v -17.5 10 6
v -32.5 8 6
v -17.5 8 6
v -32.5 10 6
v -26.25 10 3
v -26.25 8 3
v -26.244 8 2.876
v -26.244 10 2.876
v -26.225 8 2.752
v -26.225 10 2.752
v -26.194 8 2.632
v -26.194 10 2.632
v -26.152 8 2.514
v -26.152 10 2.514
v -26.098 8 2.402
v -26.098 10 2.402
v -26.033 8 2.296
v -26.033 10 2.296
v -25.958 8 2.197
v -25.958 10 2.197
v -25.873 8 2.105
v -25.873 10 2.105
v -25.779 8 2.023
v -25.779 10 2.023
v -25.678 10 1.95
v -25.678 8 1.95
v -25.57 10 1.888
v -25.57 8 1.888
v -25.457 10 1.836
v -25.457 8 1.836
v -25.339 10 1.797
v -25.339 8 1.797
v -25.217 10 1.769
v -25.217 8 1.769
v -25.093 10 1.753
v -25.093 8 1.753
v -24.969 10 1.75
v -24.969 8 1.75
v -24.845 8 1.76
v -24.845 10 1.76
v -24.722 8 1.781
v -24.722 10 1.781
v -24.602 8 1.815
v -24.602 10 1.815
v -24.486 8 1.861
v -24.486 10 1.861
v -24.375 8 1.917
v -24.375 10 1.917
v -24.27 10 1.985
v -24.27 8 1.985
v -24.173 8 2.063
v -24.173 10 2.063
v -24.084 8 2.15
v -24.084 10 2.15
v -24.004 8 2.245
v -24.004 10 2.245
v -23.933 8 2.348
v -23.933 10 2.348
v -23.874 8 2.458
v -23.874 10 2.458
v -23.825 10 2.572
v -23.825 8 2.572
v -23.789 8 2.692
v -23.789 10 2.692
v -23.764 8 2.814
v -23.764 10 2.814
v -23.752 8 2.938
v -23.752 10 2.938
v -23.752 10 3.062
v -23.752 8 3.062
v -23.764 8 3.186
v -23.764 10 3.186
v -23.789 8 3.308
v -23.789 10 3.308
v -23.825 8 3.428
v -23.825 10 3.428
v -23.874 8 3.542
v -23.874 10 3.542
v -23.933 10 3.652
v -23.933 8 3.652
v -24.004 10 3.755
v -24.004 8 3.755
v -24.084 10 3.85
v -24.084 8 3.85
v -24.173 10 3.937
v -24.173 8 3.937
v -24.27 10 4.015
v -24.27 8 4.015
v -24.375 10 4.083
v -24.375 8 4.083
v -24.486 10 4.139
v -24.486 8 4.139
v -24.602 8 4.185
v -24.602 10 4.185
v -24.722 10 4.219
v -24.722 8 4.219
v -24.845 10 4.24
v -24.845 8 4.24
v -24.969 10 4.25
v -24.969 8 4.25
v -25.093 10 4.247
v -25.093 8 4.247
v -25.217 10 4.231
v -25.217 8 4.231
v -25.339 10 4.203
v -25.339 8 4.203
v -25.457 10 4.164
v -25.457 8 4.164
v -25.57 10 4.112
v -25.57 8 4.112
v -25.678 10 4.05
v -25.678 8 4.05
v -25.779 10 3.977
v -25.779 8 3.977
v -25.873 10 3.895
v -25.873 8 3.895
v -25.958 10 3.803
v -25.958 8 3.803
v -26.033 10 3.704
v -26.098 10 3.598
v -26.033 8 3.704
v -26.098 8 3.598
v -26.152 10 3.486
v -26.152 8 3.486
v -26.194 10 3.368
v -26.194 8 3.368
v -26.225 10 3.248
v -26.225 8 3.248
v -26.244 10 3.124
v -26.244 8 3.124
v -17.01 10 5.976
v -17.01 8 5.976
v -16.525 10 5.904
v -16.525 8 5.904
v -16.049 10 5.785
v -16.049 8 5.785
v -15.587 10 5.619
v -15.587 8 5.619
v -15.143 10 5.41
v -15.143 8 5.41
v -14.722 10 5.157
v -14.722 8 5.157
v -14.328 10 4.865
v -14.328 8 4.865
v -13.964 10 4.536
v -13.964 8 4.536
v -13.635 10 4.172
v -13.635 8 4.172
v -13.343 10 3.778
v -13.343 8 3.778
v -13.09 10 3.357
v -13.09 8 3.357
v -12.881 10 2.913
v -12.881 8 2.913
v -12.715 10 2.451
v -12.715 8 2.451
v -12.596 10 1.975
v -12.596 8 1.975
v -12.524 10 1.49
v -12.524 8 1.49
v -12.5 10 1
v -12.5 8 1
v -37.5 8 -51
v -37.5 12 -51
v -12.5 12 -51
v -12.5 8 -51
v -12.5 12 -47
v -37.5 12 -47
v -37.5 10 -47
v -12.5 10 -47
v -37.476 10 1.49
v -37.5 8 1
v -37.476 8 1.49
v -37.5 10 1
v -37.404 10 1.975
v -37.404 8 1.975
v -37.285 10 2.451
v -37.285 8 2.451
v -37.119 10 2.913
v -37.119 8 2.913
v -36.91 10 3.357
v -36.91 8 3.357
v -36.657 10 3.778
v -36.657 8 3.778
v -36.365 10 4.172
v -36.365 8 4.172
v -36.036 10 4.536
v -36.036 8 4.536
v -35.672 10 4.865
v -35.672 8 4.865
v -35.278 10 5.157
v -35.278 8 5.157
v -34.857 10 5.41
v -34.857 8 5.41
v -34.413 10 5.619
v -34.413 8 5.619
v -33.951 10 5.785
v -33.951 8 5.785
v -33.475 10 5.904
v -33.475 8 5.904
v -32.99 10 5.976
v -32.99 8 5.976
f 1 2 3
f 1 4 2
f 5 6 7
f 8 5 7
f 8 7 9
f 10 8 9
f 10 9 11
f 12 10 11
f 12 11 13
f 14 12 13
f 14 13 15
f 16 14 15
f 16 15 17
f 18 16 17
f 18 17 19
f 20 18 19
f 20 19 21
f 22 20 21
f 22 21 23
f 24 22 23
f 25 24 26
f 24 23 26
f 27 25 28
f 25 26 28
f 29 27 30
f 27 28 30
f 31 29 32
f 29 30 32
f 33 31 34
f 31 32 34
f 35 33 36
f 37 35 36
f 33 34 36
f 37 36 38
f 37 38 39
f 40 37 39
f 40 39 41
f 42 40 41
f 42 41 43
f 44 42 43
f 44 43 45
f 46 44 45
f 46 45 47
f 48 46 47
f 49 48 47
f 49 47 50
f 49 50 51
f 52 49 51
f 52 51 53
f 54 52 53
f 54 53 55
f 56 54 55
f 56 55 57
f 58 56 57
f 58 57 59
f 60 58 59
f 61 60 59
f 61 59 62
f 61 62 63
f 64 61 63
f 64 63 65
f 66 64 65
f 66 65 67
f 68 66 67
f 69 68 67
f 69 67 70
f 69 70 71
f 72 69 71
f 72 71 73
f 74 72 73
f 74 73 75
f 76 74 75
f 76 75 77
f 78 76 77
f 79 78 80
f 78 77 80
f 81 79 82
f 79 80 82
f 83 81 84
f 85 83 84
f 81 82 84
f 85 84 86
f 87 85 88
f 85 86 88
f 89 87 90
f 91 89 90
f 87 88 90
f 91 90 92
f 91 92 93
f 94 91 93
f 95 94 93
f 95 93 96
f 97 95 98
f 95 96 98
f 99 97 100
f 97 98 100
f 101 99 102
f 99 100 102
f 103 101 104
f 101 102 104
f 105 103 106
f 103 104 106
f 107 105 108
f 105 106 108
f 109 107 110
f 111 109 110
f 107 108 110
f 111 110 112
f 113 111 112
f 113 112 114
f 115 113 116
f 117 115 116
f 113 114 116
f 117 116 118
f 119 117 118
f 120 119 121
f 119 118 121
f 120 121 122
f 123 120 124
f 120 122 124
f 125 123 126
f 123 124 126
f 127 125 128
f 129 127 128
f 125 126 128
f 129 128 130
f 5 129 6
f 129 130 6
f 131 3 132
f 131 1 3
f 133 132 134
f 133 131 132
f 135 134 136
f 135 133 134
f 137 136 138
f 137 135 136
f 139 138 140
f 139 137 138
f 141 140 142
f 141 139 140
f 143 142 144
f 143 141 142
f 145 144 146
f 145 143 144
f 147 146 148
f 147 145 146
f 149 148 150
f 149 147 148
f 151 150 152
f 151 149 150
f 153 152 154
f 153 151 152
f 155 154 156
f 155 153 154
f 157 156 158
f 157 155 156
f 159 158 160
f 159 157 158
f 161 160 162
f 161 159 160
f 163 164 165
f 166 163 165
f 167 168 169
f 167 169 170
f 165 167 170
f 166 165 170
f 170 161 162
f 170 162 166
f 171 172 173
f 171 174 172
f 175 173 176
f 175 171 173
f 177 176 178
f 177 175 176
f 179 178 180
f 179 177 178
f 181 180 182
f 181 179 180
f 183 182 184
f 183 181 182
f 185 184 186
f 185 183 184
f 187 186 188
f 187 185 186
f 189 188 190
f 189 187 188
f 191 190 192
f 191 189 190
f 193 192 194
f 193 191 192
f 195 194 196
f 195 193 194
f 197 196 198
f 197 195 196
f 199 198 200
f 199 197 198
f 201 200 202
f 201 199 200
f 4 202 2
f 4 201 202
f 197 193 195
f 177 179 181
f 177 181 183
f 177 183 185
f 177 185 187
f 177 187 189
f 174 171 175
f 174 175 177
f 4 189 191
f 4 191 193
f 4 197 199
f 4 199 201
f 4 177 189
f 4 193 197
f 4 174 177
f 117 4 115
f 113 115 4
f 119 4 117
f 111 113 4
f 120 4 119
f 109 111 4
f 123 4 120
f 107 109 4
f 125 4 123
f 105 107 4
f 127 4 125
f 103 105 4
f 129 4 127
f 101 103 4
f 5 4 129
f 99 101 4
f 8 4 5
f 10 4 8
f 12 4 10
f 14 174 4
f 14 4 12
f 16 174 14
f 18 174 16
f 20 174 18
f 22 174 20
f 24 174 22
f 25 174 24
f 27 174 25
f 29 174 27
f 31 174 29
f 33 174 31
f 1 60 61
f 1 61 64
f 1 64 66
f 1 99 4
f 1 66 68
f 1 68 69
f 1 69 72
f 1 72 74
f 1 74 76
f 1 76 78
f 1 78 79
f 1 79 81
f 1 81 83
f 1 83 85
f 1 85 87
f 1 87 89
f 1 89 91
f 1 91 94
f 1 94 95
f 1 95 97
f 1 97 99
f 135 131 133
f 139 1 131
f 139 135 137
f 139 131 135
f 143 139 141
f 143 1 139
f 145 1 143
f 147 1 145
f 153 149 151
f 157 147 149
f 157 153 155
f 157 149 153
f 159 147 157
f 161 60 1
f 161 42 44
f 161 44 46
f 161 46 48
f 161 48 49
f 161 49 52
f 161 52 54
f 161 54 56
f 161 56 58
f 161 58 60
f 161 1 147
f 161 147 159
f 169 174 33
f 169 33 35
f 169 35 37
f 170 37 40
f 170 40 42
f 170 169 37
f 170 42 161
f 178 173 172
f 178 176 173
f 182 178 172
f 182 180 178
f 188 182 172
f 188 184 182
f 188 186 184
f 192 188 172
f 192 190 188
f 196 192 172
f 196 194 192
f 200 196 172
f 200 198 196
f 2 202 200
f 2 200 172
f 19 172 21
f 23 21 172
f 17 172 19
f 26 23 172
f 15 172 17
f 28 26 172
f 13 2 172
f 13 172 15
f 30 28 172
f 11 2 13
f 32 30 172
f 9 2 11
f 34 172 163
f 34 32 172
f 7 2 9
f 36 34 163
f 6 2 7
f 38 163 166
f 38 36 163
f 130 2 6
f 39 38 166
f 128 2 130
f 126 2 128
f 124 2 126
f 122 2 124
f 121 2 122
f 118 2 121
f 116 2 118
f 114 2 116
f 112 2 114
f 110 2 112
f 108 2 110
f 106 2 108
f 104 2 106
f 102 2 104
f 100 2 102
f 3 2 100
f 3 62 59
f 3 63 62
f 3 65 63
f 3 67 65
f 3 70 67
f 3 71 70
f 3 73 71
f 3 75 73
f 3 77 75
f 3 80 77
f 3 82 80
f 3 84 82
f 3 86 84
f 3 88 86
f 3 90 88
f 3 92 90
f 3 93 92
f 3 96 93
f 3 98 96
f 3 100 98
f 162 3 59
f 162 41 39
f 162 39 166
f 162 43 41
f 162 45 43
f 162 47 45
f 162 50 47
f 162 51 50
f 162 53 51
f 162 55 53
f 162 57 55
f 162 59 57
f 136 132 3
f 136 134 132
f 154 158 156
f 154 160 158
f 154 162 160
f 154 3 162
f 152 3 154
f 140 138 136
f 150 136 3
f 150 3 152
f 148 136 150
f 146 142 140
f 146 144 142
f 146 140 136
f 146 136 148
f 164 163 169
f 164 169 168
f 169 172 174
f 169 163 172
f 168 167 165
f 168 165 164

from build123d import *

# Parameters (mm, degrees)
SCHIZZO1_W                   = 25
SCHIZZO1_H                   = 2
ESTRUSIONE_ESTRUSIONE1_DEPTH = 47
SCHIZZO2_W                   = 25
SCHIZZO2_H                   = 2
ESTRUSIONE_ESTRUSIONE2_DEPTH = 6
FORO_FILETTATO_M3X0_5_1_D    = 2.5
RACCORDO1_R                  = 5
ESTRUSIONE_ESTRUSIONE3_DEPTH = 4


with BuildPart() as part:
    # Schizzo1 → Estrusione-Estrusione1 (new body)
    with BuildSketch(Plane.XY):
        with Locations((-25, 9)):
            Rectangle(SCHIZZO1_W, SCHIZZO1_H)
    extrude(amount=-ESTRUSIONE_ESTRUSIONE1_DEPTH)

    # Schizzo2 → Estrusione-Estrusione2 (add)
    with BuildSketch(Plane.XY):
        with Locations((-25, 9)):
            Rectangle(SCHIZZO2_W, SCHIZZO2_H)
    extrude(amount=ESTRUSIONE_ESTRUSIONE2_DEPTH)

    # Foro filettato M3x0.5-1 (through all)
    with Locations(Plane(origin=(0, 10, 0), x_dir=(1, 0, 0), z_dir=(0, 1, 0))):
        with Locations((-25, -3)):
            Hole(FORO_FILETTATO_M3X0_5_1_D / 2)

    # Raccordo1
    raccordo1_edges = [part.edges().sort_by_distance(p)[0] for p in [
        (-37.5, 9, 6),
        (-12.5, 9, 6),
    ]]
    fillet(raccordo1_edges, radius=RACCORDO1_R)

    # Schizzo5 → Estrusione-Estrusione3 (add)
    with BuildSketch(Plane(origin=(0, 0, -47), x_dir=(-1, 0, 0), z_dir=(0, 0, -1))):
        Polygon((12.5, 10), (12.5, 12), (37.5, 12), (37.5, 10), (37.5, 8), (12.5, 8), align=None)
    extrude(amount=ESTRUSIONE_ESTRUSIONE3_DEPTH)


solid = part.part
